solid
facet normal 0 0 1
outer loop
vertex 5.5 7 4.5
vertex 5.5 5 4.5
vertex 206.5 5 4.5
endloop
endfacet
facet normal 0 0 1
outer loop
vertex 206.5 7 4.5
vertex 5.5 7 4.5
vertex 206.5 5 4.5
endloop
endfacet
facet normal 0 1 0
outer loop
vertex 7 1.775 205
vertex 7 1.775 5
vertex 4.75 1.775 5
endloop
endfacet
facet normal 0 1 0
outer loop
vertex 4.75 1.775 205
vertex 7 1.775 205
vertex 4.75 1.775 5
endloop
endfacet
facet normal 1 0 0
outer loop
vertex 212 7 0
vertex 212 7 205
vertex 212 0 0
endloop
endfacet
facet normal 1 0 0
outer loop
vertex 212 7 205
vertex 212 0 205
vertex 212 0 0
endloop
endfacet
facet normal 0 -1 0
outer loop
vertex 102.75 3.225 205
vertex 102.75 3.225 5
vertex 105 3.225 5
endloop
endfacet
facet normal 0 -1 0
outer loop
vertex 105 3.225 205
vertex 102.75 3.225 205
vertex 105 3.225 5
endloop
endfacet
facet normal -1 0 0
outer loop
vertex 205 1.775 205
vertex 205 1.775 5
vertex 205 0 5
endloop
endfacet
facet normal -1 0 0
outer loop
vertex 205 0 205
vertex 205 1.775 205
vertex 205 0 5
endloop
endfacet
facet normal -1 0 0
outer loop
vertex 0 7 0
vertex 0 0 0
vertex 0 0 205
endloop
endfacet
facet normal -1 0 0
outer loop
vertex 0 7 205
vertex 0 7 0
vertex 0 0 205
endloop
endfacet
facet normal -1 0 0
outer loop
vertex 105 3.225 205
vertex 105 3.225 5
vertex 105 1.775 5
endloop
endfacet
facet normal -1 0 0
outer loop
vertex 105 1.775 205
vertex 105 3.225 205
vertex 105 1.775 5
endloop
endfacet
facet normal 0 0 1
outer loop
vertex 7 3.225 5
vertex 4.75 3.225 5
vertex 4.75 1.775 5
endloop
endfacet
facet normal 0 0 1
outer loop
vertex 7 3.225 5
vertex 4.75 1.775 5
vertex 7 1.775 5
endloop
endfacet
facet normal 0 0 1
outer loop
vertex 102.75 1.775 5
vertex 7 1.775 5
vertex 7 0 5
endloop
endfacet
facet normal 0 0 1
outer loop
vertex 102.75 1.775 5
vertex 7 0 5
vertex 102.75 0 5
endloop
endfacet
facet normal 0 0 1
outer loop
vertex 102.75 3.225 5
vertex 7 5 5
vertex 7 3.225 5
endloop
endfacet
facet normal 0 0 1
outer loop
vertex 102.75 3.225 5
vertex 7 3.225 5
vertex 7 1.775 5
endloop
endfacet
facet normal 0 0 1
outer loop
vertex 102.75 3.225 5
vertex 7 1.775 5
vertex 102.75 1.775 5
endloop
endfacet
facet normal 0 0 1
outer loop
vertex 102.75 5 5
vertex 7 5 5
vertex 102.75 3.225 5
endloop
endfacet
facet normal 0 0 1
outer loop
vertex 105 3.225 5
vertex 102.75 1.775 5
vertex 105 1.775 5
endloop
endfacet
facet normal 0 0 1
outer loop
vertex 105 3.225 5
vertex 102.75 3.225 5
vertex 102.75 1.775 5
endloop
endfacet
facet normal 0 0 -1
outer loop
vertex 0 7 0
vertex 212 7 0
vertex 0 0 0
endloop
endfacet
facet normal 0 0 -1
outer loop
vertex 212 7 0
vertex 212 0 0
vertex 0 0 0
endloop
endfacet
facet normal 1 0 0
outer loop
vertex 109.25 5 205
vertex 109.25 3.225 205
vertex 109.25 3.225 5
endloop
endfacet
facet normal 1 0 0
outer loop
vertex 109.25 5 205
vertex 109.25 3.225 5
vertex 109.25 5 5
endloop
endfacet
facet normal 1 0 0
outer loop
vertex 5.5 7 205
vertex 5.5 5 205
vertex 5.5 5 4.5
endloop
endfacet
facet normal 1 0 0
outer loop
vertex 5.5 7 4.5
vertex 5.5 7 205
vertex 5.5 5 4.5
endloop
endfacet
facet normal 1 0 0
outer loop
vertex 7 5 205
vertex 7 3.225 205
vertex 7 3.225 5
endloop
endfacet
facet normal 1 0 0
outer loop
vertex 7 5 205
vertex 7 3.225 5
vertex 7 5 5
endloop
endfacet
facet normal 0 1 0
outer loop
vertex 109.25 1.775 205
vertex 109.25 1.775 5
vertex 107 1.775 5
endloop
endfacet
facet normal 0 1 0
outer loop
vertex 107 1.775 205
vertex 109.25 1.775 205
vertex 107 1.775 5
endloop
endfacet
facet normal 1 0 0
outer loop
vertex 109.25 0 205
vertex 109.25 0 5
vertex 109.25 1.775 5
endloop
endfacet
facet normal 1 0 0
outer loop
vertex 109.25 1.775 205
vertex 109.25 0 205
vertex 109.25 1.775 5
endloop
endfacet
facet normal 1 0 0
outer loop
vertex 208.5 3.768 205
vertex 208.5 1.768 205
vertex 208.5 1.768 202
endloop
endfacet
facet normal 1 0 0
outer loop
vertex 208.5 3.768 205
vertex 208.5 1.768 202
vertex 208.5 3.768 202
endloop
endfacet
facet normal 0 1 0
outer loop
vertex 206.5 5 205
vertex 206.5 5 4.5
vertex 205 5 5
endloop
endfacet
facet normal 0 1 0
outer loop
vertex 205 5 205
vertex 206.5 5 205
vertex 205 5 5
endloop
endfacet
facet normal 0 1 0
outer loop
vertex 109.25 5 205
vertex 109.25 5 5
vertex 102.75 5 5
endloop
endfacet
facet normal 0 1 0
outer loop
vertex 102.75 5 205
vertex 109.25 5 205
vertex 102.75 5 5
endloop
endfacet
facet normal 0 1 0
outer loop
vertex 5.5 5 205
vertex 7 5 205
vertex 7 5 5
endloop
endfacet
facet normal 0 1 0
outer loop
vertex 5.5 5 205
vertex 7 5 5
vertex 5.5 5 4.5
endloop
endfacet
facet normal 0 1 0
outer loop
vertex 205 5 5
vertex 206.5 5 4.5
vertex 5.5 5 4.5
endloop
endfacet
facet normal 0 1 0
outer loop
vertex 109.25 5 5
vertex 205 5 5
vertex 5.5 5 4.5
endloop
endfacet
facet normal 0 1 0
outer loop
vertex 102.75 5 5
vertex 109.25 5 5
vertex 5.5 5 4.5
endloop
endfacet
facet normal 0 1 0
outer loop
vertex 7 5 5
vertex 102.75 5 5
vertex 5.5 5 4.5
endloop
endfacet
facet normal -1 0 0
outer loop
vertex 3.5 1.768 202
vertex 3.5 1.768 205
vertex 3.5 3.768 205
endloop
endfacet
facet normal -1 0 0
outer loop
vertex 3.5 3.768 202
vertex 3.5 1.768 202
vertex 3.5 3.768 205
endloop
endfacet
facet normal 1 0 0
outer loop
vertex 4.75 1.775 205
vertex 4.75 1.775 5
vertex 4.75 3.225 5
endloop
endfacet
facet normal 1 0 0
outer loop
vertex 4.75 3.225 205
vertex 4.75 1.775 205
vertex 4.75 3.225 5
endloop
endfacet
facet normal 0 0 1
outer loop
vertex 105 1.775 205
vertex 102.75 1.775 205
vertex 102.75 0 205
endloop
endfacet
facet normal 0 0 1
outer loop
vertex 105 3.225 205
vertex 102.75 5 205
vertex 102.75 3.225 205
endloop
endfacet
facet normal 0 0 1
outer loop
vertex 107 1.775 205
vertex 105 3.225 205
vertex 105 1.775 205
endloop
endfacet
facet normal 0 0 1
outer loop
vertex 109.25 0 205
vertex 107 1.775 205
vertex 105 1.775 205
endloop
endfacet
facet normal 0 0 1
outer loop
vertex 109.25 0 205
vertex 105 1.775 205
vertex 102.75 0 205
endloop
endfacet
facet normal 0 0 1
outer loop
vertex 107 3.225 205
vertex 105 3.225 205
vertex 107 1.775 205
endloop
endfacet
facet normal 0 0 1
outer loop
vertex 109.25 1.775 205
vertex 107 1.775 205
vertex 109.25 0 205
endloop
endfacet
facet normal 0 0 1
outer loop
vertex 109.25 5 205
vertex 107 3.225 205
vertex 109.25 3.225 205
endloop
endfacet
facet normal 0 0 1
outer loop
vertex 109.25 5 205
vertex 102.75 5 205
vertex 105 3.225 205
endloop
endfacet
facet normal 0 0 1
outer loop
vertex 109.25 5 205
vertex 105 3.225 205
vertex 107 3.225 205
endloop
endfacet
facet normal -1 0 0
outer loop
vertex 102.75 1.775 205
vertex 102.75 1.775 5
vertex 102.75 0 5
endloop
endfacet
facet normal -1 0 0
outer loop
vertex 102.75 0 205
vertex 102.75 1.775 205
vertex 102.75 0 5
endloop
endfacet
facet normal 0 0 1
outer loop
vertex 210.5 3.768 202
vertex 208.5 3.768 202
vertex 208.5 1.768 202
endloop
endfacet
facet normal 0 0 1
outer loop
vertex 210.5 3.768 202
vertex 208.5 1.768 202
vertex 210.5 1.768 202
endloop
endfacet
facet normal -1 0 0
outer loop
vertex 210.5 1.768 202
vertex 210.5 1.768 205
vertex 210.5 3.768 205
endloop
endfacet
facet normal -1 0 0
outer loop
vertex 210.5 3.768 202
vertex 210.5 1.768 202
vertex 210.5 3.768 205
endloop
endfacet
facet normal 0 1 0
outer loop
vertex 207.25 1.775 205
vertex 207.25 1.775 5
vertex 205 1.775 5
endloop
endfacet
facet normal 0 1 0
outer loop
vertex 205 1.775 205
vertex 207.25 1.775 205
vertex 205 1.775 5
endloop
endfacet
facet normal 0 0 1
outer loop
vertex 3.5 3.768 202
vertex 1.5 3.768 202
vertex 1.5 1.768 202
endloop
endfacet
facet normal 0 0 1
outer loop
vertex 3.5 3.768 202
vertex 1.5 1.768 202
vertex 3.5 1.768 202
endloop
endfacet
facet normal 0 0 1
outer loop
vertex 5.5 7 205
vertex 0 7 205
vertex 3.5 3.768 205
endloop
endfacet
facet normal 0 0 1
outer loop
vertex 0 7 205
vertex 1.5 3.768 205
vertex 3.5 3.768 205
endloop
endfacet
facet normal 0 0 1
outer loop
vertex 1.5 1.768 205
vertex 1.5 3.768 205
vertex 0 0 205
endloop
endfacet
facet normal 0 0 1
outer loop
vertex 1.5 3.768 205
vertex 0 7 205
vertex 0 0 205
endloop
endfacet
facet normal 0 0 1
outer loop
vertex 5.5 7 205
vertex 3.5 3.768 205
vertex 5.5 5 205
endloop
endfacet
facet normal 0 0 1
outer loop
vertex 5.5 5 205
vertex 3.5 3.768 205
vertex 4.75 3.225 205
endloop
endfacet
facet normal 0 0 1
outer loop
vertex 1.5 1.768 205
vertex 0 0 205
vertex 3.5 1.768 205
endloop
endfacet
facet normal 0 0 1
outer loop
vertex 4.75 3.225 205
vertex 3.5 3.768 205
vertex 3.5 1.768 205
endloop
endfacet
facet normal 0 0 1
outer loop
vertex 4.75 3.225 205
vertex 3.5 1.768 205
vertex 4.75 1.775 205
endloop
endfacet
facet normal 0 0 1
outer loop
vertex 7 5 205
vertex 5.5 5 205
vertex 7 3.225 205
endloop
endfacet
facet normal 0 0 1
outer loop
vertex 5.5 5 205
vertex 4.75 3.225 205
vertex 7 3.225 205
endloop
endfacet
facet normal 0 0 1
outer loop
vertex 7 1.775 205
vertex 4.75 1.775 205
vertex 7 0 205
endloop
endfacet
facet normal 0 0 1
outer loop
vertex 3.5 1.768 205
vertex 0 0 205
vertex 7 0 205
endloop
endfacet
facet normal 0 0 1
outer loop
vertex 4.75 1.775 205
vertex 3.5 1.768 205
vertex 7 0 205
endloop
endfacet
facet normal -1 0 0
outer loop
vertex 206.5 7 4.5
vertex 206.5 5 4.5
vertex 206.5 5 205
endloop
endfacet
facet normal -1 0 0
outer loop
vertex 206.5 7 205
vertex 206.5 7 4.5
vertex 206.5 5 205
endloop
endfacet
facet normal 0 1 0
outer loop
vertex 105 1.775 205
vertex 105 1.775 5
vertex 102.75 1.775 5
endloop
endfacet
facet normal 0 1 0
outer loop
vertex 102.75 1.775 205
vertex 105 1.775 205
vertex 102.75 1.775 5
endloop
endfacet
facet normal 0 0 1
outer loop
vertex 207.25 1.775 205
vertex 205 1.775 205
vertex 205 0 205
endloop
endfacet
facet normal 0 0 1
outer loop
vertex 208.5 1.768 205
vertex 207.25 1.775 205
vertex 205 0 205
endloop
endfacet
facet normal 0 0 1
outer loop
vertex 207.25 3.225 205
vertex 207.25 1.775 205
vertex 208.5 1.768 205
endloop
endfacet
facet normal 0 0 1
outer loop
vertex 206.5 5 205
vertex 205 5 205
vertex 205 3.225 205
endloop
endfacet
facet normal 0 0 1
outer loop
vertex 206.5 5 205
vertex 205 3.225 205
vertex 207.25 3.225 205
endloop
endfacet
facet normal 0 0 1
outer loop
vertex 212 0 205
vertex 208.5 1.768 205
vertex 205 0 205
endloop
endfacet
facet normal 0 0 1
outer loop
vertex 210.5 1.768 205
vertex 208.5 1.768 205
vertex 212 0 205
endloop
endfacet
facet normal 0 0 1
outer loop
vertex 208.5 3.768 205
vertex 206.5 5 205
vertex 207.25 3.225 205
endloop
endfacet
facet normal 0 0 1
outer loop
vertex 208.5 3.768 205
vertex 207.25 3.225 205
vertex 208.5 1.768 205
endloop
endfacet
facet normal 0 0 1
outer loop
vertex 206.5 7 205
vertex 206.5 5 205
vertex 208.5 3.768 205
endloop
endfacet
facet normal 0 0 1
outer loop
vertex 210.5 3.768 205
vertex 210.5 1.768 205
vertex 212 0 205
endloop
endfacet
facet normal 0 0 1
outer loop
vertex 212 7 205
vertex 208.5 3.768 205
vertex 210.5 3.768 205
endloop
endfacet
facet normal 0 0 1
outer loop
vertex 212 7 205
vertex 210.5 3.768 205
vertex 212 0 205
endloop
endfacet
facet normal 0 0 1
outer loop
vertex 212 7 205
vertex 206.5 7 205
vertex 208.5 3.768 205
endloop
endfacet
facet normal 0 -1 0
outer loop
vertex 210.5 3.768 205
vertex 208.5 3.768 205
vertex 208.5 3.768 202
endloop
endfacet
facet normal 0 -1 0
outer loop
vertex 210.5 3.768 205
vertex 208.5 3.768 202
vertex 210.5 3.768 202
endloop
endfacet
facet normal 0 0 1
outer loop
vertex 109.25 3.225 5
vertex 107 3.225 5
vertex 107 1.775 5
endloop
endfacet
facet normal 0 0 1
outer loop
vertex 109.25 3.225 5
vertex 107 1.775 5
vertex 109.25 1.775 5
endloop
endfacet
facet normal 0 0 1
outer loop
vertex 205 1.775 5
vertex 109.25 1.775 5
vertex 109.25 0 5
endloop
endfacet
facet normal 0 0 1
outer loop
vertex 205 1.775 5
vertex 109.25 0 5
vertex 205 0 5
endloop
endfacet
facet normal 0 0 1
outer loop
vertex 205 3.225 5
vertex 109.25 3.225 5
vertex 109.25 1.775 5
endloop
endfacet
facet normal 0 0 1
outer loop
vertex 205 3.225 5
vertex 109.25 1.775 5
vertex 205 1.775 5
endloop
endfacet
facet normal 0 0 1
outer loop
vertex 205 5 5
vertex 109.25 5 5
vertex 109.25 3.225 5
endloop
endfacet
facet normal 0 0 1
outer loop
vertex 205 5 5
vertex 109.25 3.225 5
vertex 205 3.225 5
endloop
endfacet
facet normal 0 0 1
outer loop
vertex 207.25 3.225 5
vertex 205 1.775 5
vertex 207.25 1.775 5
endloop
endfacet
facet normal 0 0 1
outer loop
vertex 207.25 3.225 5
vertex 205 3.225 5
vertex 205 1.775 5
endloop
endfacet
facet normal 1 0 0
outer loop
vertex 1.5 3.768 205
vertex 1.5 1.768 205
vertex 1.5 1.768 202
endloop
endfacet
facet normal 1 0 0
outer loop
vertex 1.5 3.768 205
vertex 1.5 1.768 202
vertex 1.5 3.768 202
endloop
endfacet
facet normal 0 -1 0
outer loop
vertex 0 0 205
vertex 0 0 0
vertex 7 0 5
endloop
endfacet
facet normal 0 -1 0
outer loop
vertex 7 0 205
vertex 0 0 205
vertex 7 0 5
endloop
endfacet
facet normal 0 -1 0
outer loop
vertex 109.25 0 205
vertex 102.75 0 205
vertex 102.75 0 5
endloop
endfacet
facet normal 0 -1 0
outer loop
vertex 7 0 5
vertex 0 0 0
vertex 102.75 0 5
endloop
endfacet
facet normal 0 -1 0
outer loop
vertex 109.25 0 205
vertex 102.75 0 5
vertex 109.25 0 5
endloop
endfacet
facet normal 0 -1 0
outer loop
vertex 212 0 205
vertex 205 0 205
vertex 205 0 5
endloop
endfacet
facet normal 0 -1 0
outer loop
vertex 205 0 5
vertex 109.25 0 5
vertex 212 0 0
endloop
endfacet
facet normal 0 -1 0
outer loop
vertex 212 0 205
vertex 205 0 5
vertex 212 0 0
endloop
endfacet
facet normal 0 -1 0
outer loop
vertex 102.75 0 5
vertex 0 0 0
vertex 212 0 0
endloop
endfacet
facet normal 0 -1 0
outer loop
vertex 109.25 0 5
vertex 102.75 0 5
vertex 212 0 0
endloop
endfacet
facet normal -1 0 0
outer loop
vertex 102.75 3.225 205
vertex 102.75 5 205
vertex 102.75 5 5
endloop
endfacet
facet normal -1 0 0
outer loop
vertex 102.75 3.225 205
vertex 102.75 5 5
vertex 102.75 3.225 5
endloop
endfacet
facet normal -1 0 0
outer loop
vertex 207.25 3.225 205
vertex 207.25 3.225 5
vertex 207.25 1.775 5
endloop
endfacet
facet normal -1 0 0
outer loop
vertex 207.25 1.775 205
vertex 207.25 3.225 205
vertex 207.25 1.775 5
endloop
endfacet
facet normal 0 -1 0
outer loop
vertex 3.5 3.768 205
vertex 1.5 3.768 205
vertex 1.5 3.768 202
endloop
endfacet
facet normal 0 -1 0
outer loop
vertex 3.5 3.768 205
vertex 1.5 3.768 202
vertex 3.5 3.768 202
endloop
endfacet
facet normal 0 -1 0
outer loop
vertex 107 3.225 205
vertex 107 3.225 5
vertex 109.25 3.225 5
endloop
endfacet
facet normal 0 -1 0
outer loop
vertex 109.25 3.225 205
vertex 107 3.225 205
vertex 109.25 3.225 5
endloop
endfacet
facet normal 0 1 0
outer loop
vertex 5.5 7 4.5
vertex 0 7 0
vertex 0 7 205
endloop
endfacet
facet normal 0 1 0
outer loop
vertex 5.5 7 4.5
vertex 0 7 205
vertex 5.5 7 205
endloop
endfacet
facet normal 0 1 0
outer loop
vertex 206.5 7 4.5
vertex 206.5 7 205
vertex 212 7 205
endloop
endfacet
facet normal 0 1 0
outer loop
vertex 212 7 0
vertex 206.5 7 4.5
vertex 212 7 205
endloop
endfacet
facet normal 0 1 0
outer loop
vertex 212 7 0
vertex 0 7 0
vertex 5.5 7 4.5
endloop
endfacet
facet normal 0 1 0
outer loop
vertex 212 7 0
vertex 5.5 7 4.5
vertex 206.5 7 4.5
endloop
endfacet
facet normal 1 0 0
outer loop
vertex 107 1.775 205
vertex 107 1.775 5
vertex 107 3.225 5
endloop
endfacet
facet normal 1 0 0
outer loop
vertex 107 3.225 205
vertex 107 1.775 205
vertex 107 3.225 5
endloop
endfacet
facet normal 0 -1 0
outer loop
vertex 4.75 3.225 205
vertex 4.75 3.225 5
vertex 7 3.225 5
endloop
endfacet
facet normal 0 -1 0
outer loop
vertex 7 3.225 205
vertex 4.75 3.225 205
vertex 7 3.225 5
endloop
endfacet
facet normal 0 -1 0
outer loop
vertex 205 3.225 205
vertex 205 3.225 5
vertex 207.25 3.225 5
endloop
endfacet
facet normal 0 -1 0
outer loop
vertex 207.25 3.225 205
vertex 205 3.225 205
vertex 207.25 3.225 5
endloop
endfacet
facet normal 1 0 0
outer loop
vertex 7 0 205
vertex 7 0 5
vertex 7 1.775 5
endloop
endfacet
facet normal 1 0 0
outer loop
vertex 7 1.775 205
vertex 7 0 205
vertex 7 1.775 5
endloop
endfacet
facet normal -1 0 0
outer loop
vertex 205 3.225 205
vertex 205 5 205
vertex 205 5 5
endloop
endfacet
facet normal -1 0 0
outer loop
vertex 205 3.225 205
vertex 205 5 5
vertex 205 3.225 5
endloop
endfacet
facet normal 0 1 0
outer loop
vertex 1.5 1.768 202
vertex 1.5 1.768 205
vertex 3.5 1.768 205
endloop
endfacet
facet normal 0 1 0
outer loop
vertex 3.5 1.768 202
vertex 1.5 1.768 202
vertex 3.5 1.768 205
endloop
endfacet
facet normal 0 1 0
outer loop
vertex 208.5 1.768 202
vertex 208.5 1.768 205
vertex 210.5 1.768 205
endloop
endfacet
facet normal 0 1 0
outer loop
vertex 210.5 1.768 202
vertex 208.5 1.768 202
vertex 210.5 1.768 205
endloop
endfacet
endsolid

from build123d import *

# Parameters (mm, degrees)
SKETCH1_W           = 2.25
SKETCH1_H           = 1.45
BOSS_EXTRUDE1_DEPTH = 5
BOSS_EXTRUDE2_DEPTH = 200
BOSS_EXTRUDE3_DEPTH = 2
SKETCH4_W           = 2
SKETCH4_H           = 2
CUT_EXTRUDE1_DEPTH  = 3


with BuildPart() as part:
    # Sketch1 → Boss-Extrude1 (new body)
    with BuildSketch(Plane.XY):
        Polygon((0, 0), (7, 0), (7, 1.775), (4.75, 1.775), (4.75, 3.225), (7, 3.225), (7, 5), (0, 5), align=None)
        with Locations((5.875, 2.5)):
            Rectangle(SKETCH1_W, SKETCH1_H)
        Polygon((7, 0), (102.75, 0), (102.75, 1.775), (102.75, 3.225), (102.75, 5), (7, 5), (7, 3.225), (7, 1.775), align=None)
        with Locations((103.875, 2.5)):
            Rectangle(SKETCH1_W, SKETCH1_H)
        Polygon((102.75, 0), (106, 0), (106, 5), (102.75, 5), (102.75, 3.225), (105, 3.225), (105, 1.775), (102.75, 1.775), align=None)
        Polygon((106, 5), (106, 0), (109.25, 0), (109.25, 1.775), (107, 1.775), (107, 3.225), (109.25, 3.225), (109.25, 5), align=None)
        with Locations((108.125, 2.5)):
            Rectangle(SKETCH1_W, SKETCH1_H)
        Polygon((109.25, 1.775), (109.25, 0), (205, 0), (205, 1.775), (205, 3.225), (205, 5), (109.25, 5), (109.25, 3.225), align=None)
        with Locations((206.125, 2.5)):
            Rectangle(SKETCH1_W, SKETCH1_H)
        Polygon((205, 1.775), (205, 0), (212, 0), (212, 5), (205, 5), (205, 3.225), (207.25, 3.225), (207.25, 1.775), align=None)
    extrude(amount=BOSS_EXTRUDE1_DEPTH)

    # Sketch2 → Boss-Extrude2 (add)
    with BuildSketch(Plane.XY.offset(5)):
        Polygon((7, 3.225), (7, 5), (0, 5), (0, 0), (7, 0), (7, 1.775), (4.75, 1.775), (4.75, 3.225), align=None)
        Polygon((109.25, 3.225), (109.25, 5), (102.75, 5), (102.75, 3.225), (105, 3.225), (105, 1.775), (102.75, 1.775), (102.75, 0), (109.25, 0), (109.25, 1.775), (107, 1.775), (107, 3.225), align=None)
        Polygon((205, 5), (205, 3.225), (207.25, 3.225), (207.25, 1.775), (205, 1.775), (205, 0), (212, 0), (212, 5), align=None)
    extrude(amount=BOSS_EXTRUDE2_DEPTH)

    # Sketch3 → Boss-Extrude3 (add)
    with BuildSketch(Plane(origin=(0, 5, 0), x_dir=(1, 0, 0), z_dir=(0, 1, 0))):
        Polygon((5.5, -205), (5.5, -4.5), (206.5, -4.5), (206.5, -205), (212, -205), (212, 0), (0, 0), (0, -205), align=None)
    extrude(amount=BOSS_EXTRUDE3_DEPTH)

    # Sketch4 → Cut-Extrude1 (cut)
    with BuildSketch(Plane.XY.offset(205)):
        with Locations((209.5, 2.76849414)):
            Rectangle(SKETCH4_W, SKETCH4_H)
        with Locations((2.5, 2.76849414)):
            Rectangle(SKETCH4_W, SKETCH4_H)
    extrude(amount=-CUT_EXTRUDE1_DEPTH, mode=Mode.SUBTRACT)


solid = part.part
